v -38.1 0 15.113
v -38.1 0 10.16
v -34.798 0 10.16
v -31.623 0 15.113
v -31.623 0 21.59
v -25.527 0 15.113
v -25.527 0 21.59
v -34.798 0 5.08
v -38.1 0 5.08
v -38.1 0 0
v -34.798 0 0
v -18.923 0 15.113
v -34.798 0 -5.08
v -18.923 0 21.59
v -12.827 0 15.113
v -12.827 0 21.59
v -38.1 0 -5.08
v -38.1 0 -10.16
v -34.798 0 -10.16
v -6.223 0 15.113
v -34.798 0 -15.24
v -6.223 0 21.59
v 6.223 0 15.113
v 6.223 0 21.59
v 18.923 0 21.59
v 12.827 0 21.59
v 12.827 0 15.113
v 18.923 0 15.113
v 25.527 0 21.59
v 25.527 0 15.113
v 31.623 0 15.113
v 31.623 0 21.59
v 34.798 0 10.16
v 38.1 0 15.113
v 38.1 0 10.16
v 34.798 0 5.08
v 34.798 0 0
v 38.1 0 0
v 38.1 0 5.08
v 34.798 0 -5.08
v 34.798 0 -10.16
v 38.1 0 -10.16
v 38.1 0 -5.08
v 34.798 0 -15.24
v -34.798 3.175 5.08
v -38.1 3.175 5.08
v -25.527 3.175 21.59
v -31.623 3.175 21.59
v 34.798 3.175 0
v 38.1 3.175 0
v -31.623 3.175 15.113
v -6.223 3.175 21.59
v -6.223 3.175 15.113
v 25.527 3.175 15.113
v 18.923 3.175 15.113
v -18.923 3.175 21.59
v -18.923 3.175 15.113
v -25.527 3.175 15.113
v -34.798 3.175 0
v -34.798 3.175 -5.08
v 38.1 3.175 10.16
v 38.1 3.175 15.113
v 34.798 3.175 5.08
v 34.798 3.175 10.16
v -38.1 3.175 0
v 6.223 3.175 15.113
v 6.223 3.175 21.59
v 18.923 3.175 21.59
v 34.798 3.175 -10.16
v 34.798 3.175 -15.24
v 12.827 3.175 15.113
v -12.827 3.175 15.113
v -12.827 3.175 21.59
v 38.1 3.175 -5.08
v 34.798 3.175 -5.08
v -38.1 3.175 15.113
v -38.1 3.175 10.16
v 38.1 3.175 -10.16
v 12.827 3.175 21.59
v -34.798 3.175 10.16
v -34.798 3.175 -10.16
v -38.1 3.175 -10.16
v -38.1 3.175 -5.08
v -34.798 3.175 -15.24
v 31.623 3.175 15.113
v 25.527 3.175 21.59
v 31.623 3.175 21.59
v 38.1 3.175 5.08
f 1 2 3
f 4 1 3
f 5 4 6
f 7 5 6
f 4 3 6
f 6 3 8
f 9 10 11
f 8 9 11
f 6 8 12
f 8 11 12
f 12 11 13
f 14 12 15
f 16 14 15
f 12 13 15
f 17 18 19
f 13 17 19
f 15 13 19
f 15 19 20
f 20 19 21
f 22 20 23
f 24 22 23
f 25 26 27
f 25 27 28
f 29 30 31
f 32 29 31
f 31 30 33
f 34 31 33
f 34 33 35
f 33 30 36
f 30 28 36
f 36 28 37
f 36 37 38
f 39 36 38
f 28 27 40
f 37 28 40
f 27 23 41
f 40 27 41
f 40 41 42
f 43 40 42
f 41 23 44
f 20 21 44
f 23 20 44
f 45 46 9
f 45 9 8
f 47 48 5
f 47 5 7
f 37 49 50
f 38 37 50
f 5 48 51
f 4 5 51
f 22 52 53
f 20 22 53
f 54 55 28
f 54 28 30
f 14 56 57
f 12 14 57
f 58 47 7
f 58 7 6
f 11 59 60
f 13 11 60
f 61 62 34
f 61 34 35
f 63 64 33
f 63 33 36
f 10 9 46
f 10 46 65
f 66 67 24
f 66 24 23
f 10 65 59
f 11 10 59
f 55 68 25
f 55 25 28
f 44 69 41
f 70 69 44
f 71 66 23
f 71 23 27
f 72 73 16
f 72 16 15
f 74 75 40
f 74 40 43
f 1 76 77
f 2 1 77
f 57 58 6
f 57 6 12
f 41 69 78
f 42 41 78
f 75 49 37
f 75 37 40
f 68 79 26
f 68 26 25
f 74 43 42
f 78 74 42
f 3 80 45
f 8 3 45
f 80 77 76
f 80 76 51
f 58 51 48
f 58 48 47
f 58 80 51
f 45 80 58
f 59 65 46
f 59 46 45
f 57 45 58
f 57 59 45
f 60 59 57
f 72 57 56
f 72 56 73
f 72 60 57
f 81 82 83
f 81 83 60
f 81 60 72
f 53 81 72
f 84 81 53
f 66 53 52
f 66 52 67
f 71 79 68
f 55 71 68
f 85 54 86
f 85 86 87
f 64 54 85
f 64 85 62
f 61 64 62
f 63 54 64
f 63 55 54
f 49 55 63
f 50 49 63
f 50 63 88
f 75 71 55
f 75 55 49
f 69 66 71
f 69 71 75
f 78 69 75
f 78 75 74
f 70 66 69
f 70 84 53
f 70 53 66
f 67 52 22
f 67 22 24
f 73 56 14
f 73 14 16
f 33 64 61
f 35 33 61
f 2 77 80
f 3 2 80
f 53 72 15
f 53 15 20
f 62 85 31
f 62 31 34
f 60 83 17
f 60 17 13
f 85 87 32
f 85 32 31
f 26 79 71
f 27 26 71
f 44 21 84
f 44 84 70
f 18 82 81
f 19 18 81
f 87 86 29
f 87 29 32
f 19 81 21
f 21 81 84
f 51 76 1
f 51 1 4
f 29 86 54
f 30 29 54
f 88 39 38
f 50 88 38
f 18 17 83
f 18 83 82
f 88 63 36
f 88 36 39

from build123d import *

# Parameters (mm, degrees)
SKETCH1_W           = 76.2
SKETCH1_H           = 30.48
BOSS_EXTRUDE1_DEPTH = 3.175
SKETCH5_W           = 3.302
SKETCH5_H           = 5.08
CUT_EXTRUDE2_DEPTH  = 42.157602275
SKETCH6_W           = 76.2
SKETCH6_H           = 6.35
BOSS_EXTRUDE3_DEPTH = 3.175
SKETCH7_W           = 6.604
SKETCH7_H           = 6.604
CUT_EXTRUDE3_DEPTH  = 44.906932539


with BuildPart() as part:
    # Sketch1 → Boss-Extrude1 (new body)
    with BuildSketch(Plane(origin=(0, 0, 0), x_dir=(1, 0, 0), z_dir=(0, 1, 0))):
        Rectangle(SKETCH1_W, SKETCH1_H)
    extrude(amount=BOSS_EXTRUDE1_DEPTH)

    # Sketch5 → Cut-Extrude2 (cut, through all)
    with BuildSketch(Plane(origin=(0, 3.175, 0), x_dir=(1, 0, 0), z_dir=(0, 1, 0))):
        with Locations((-36.449, 2.54)):
            Rectangle(SKETCH5_W, SKETCH5_H)
        with Locations((-36.449, 12.7)):
            Rectangle(SKETCH5_W, SKETCH5_H)
        with Locations((-36.449, -7.62)):
            Rectangle(SKETCH5_W, SKETCH5_H)
        with Locations((36.449, -7.62)):
            Rectangle(SKETCH5_W, SKETCH5_H)
        with Locations((36.449, 2.54)):
            Rectangle(SKETCH5_W, SKETCH5_H)
        with Locations((36.449, 12.7)):
            Rectangle(SKETCH5_W, SKETCH5_H)
    extrude(amount=-CUT_EXTRUDE2_DEPTH, mode=Mode.SUBTRACT)

    # Sketch6 → Boss-Extrude3 (add)
    with BuildSketch(Plane(origin=(0, 3.175, 0), x_dir=(1, 0, 0), z_dir=(0, 1, 0))):
        with Locations((0, -18.415)):
            Rectangle(SKETCH6_W, SKETCH6_H)
    extrude(amount=-BOSS_EXTRUDE3_DEPTH)

    # Sketch7 → Cut-Extrude3 (cut, through all)
    with BuildSketch(Plane(origin=(0, 3.175, 0), x_dir=(1, 0, 0), z_dir=(0, 1, 0))):
        with Locations((-34.925, -18.415)):
            Rectangle(SKETCH7_W, SKETCH7_H)
        with Locations((-22.225, -18.415)):
            Rectangle(SKETCH7_W, SKETCH7_H)
        with Locations((-9.525, -18.415)):
            Rectangle(SKETCH7_W, SKETCH7_H)
        with Locations((9.525, -18.415)):
            Rectangle(SKETCH7_W, SKETCH7_H)
        with Locations((22.225, -18.415)):
            Rectangle(SKETCH7_W, SKETCH7_H)
        with Locations((34.925, -18.415)):
            Rectangle(SKETCH7_W, SKETCH7_H)
    extrude(amount=-CUT_EXTRUDE3_DEPTH, mode=Mode.SUBTRACT)


solid = part.part
